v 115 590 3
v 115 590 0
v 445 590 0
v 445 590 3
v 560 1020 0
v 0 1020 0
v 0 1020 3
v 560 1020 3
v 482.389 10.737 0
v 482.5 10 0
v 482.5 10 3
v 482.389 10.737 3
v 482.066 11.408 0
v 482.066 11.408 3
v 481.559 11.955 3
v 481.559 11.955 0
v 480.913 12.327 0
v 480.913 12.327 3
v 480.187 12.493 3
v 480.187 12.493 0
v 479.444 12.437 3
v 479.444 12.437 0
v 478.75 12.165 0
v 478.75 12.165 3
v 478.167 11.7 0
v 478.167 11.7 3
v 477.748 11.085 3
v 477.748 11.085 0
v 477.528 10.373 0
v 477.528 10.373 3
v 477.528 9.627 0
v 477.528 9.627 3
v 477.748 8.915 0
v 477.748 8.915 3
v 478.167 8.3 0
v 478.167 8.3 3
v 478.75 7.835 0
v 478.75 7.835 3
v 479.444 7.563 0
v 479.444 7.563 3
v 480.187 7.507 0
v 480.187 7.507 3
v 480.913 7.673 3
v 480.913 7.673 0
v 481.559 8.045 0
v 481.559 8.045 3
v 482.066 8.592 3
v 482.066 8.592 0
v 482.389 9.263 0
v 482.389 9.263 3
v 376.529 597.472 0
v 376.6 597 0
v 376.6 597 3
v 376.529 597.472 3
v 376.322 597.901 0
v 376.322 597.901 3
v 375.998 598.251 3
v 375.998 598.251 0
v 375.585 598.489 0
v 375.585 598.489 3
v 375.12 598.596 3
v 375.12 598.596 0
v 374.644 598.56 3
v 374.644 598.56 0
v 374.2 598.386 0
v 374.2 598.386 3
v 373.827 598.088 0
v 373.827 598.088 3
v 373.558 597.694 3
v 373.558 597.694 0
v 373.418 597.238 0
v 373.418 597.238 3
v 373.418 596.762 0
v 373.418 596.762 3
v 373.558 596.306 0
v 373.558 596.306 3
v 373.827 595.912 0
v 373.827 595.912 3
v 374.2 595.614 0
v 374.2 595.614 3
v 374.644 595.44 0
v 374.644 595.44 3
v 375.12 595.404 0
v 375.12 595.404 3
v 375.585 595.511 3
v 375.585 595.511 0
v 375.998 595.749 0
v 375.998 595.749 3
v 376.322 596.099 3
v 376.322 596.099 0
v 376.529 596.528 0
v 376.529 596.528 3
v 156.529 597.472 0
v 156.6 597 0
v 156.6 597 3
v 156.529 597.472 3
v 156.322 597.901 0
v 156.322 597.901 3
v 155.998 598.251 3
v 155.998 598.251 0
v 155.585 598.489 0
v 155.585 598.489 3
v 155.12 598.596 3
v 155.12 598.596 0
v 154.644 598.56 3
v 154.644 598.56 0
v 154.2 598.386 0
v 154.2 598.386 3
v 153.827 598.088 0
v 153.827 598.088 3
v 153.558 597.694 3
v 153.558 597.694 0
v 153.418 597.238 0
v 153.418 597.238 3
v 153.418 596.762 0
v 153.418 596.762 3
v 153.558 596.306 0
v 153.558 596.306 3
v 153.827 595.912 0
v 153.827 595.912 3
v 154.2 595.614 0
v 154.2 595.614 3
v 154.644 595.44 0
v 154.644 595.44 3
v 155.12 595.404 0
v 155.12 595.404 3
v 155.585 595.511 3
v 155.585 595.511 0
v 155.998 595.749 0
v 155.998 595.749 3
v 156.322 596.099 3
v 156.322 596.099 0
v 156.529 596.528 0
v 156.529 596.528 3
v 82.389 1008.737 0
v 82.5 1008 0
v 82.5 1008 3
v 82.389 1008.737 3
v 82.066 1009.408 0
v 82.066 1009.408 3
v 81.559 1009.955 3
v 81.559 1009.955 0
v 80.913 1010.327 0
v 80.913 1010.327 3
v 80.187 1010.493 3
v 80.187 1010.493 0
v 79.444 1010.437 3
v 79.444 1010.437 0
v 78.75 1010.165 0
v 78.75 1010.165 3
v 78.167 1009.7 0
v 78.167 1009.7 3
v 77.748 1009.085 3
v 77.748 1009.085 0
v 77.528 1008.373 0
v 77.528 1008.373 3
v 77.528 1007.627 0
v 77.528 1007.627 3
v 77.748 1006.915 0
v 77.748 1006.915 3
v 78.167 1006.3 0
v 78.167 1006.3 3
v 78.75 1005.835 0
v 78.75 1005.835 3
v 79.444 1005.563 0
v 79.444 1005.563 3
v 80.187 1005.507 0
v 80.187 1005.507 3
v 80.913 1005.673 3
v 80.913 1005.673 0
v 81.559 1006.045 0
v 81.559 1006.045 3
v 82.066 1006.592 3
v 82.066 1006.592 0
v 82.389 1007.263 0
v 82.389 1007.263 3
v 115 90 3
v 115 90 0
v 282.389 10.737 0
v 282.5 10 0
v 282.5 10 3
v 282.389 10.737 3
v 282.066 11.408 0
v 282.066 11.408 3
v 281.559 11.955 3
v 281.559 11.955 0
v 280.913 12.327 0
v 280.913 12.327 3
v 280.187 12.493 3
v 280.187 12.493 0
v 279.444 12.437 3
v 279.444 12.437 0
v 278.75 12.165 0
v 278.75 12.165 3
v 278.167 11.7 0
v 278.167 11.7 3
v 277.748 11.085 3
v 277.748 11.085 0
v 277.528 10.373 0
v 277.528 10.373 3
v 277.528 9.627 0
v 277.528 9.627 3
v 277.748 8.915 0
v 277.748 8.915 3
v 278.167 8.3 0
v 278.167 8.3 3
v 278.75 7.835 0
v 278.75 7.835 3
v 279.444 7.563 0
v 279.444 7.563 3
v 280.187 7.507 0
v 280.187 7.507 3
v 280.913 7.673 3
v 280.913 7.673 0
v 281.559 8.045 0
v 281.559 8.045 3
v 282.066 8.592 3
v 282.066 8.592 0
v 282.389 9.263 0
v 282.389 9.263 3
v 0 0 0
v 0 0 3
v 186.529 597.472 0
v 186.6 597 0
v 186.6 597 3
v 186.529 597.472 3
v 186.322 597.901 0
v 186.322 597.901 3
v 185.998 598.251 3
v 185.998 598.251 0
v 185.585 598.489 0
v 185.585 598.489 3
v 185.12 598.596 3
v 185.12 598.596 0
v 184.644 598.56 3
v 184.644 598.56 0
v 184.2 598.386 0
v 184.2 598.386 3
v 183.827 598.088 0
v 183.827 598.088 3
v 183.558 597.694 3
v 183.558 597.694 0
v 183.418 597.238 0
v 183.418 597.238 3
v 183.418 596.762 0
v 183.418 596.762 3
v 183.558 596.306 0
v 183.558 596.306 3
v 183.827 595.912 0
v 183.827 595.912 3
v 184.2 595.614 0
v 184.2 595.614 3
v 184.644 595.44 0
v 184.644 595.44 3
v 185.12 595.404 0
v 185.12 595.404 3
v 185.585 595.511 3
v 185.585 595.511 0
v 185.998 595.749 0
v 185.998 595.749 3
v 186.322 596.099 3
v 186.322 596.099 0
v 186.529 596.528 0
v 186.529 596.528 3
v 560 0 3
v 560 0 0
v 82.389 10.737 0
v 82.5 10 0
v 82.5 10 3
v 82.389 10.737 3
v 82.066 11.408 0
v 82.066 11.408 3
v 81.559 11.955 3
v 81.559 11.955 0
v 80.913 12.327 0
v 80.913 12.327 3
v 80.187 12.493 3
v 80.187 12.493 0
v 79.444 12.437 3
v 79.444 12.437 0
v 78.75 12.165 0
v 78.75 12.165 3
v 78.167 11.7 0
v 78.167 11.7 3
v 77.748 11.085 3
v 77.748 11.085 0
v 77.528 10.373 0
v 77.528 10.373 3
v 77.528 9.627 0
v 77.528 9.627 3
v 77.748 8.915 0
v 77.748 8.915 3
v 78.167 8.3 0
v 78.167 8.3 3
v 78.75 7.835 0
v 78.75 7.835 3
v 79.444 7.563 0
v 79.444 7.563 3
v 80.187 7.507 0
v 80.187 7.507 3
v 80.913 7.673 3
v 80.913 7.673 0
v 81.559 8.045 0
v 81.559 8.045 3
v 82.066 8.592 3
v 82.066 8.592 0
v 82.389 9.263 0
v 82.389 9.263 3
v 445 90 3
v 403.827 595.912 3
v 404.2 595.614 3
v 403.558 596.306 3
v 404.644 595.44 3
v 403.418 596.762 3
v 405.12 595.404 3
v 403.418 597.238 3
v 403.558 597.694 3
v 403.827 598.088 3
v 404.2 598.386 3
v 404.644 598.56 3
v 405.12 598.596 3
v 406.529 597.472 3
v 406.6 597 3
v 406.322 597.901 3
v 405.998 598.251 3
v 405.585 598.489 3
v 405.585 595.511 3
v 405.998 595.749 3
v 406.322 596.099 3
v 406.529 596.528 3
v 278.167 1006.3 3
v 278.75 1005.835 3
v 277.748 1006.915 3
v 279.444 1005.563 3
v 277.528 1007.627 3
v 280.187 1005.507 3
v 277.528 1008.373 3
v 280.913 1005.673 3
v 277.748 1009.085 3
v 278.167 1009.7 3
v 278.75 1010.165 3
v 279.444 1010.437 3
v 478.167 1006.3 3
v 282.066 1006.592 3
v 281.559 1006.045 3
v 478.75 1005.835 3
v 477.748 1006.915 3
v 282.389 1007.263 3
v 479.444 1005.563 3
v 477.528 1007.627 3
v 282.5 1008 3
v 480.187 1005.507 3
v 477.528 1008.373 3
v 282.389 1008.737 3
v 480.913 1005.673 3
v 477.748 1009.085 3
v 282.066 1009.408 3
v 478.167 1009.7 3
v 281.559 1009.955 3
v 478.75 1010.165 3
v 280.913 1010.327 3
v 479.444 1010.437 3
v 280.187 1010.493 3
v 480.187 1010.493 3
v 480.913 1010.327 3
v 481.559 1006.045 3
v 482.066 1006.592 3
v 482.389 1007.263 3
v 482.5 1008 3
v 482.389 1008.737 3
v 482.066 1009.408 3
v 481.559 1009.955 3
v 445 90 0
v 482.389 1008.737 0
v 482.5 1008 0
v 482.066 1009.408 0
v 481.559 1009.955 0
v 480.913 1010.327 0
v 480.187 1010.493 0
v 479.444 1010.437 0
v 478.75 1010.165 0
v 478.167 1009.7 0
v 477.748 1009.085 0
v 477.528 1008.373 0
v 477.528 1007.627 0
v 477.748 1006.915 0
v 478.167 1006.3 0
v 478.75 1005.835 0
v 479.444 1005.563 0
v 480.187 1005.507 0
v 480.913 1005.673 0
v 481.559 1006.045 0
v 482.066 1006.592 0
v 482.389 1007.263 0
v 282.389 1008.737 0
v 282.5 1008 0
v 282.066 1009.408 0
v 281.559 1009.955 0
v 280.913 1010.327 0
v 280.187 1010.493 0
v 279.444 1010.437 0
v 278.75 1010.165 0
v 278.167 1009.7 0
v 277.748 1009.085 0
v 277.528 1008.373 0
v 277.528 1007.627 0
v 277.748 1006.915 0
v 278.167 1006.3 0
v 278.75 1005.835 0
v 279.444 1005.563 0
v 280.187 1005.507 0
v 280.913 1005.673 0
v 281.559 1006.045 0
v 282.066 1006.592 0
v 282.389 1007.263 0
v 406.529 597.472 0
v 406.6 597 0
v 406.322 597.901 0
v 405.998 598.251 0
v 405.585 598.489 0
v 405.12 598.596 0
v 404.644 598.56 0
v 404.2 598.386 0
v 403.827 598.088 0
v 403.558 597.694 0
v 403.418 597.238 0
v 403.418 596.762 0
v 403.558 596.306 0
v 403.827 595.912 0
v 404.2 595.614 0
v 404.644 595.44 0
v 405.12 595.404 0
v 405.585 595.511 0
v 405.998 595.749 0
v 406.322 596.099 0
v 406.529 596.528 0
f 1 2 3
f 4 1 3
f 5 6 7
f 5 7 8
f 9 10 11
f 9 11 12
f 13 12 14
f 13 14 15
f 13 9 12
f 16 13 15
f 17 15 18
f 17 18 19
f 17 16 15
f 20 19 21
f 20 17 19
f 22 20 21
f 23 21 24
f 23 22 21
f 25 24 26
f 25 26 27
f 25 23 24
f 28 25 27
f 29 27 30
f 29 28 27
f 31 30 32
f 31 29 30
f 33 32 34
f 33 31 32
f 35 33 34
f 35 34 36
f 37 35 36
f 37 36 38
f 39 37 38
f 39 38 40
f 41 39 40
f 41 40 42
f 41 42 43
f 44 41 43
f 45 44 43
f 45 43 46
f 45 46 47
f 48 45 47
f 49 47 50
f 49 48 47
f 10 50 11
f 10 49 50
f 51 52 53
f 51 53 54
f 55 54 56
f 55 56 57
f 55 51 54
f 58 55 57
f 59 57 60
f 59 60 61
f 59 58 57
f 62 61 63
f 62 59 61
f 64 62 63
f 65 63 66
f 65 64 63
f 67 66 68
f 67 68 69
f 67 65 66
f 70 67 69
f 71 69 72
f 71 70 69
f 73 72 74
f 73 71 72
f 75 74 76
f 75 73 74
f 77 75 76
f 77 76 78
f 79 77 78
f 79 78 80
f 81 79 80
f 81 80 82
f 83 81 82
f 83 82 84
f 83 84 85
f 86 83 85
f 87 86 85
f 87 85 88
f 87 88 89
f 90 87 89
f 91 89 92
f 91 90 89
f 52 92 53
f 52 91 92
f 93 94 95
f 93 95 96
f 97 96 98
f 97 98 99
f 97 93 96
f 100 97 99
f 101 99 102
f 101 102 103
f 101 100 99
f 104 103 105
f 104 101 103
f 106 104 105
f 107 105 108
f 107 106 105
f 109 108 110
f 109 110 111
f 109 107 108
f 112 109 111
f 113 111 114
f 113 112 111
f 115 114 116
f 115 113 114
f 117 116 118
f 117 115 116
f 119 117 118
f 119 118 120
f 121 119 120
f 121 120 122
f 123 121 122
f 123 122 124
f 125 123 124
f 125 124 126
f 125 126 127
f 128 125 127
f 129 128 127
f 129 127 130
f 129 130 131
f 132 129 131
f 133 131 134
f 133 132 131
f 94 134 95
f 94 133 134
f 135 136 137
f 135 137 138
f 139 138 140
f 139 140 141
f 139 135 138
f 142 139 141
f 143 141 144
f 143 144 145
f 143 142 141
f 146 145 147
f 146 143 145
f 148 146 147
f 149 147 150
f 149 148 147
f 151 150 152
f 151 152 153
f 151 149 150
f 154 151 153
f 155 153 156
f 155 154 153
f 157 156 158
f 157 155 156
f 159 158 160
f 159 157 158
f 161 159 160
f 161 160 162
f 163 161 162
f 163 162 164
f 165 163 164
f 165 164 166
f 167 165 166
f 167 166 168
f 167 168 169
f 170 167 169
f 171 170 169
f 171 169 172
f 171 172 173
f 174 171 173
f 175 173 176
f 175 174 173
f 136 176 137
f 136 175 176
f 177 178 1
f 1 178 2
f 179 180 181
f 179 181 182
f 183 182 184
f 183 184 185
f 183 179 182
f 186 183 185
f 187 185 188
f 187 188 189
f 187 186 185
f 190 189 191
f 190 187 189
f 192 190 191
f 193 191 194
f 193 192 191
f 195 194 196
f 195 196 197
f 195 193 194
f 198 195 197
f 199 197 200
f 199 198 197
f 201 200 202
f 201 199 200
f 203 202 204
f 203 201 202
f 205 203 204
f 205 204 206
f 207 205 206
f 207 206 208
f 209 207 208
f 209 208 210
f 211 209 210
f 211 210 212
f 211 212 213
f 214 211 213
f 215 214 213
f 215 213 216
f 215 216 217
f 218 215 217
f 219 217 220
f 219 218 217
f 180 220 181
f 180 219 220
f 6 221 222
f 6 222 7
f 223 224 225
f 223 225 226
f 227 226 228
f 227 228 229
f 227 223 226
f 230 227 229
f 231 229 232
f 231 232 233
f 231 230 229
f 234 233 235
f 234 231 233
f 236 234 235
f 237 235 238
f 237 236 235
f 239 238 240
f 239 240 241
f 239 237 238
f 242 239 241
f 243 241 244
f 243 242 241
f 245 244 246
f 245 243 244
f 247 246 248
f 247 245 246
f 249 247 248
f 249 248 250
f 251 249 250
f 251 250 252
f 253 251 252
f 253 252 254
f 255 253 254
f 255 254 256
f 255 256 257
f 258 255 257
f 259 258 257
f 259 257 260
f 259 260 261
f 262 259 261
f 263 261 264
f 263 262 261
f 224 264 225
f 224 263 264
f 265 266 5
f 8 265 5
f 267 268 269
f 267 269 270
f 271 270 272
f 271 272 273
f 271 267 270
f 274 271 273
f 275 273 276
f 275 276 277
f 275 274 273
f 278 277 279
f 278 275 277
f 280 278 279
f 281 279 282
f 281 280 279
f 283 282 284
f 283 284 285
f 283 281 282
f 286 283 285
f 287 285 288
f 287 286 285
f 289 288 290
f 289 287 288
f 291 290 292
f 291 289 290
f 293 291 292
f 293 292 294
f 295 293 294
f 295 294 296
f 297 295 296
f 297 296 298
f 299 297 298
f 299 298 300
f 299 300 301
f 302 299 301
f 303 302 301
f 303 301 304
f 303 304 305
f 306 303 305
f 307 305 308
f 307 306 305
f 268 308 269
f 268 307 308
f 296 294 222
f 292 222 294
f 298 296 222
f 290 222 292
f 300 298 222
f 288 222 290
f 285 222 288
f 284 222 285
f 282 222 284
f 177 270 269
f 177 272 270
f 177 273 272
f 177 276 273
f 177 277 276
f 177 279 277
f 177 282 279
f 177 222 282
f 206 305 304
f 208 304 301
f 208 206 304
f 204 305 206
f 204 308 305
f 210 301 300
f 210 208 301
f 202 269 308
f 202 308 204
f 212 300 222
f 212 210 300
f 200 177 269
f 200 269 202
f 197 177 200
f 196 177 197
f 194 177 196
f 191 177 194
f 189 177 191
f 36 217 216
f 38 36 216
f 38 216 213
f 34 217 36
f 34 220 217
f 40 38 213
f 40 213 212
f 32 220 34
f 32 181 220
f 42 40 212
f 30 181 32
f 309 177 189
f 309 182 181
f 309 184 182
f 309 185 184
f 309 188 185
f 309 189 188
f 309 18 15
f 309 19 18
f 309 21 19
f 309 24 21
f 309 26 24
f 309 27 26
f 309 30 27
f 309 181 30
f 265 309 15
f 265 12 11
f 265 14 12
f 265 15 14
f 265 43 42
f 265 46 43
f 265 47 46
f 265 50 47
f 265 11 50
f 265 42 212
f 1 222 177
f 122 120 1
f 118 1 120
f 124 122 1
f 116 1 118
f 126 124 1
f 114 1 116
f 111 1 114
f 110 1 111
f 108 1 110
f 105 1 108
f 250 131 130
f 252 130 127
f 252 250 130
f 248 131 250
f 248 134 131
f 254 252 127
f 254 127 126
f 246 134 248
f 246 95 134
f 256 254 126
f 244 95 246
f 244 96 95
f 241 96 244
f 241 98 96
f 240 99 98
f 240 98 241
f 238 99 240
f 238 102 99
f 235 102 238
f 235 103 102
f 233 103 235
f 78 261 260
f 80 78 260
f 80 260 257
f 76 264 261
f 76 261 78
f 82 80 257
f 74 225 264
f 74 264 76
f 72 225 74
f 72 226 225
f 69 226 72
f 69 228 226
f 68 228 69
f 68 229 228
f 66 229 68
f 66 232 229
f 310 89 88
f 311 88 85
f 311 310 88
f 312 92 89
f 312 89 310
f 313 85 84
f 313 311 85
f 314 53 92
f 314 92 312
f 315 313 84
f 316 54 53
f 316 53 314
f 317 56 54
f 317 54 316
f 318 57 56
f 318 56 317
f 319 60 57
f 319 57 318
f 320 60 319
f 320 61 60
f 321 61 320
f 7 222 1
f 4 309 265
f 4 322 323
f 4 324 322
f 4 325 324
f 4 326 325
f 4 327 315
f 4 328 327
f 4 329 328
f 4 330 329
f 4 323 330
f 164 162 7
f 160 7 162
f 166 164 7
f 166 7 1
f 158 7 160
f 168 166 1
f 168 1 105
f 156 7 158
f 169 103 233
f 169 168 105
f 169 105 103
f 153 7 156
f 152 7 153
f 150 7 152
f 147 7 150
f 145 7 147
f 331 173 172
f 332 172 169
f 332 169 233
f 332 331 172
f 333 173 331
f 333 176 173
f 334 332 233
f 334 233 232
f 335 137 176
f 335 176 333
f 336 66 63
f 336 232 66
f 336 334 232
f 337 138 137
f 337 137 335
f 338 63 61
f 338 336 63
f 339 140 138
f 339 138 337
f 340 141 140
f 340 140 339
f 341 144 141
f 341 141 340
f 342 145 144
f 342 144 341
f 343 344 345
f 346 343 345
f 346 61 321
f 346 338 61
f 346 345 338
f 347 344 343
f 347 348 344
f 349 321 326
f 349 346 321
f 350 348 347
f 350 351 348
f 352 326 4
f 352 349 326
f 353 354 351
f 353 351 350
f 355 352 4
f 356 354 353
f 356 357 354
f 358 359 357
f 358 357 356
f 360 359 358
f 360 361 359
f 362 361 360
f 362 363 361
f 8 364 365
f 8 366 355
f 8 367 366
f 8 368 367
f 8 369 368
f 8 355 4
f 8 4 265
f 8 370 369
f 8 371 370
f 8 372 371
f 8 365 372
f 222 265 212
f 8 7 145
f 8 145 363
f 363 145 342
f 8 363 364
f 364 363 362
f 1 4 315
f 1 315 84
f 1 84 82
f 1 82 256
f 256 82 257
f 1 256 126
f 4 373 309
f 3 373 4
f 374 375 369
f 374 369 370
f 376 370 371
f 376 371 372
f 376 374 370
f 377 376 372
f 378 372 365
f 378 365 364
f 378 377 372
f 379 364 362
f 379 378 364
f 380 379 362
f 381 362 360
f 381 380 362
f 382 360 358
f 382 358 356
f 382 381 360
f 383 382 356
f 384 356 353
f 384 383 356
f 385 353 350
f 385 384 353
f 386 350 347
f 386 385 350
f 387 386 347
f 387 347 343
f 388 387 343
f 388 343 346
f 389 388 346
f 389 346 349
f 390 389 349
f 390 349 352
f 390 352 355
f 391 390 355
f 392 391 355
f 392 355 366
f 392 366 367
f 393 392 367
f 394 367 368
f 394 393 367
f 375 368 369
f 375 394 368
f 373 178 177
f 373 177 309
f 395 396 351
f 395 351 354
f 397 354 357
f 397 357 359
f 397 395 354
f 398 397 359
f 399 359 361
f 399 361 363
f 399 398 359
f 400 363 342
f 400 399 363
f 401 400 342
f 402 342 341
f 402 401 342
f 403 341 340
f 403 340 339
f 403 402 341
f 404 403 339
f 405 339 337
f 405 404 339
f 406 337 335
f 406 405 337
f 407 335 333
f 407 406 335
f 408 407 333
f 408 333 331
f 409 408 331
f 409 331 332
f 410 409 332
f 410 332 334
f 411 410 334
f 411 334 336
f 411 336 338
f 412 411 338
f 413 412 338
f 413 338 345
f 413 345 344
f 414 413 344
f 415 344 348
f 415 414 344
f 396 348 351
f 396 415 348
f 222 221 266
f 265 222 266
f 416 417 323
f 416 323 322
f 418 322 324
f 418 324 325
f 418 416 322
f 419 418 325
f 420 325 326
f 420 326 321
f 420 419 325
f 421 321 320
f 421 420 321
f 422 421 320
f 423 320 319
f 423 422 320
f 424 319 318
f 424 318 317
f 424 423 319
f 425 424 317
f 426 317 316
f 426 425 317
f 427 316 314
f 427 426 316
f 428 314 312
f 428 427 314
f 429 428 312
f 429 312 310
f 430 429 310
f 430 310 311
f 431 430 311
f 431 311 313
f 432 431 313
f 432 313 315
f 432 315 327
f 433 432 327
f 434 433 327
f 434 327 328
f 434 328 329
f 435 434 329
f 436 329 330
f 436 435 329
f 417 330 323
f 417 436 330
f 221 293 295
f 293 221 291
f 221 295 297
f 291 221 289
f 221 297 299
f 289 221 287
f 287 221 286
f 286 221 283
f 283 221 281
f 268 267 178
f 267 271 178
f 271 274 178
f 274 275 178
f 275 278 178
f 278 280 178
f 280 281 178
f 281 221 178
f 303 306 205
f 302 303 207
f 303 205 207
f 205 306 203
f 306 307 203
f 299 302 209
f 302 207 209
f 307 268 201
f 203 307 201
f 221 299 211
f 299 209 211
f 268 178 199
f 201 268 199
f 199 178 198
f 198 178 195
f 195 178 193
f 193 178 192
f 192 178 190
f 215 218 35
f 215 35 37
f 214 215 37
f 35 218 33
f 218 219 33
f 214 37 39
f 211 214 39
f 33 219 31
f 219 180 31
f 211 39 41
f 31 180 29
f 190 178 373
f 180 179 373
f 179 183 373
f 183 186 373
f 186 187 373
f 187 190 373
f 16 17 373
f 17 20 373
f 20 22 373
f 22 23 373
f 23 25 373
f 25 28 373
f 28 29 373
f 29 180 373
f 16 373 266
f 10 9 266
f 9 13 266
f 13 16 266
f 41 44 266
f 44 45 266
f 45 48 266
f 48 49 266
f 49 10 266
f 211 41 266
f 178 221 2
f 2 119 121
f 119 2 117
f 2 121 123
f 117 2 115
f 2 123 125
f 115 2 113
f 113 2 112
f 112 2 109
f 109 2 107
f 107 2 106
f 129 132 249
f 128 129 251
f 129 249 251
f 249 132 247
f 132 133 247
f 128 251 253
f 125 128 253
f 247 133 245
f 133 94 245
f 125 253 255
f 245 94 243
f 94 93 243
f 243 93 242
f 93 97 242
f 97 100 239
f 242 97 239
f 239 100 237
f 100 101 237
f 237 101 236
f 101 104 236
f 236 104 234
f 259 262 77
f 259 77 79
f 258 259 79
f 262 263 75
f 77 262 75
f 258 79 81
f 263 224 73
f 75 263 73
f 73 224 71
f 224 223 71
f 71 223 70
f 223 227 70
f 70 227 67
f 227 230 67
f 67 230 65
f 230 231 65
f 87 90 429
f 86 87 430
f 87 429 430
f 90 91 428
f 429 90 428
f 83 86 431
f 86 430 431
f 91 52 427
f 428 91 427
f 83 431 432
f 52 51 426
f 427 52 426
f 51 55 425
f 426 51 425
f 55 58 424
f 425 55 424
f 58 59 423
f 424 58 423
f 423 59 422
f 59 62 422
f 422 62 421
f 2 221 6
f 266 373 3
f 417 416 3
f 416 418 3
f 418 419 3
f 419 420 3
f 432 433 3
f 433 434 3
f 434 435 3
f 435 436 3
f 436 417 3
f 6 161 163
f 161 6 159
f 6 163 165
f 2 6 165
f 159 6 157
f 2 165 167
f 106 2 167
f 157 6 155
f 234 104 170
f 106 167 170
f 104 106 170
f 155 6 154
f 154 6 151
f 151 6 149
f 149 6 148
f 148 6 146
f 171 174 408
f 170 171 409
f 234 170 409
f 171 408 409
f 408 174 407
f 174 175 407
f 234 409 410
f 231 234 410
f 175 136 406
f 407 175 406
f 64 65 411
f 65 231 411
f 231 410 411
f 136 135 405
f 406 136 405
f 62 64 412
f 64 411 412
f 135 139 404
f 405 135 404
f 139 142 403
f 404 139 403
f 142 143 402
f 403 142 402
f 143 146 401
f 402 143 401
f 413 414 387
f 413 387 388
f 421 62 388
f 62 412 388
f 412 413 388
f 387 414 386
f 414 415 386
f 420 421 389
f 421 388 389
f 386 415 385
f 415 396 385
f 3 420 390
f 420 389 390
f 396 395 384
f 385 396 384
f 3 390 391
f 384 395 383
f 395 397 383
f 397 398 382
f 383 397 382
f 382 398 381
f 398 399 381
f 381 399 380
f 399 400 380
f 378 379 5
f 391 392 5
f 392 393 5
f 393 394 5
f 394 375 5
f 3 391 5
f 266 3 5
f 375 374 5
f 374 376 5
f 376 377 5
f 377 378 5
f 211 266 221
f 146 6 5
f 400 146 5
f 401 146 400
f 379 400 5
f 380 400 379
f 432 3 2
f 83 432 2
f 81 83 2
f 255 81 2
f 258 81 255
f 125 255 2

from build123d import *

# Parameters (mm, degrees)
SKETCH_W   = 560
SKETCH_H   = 1020
SKETCH_R   = 2.5
SKETCH_R_2 = 1.6
SKETCH_W_2 = 330
SKETCH_H_2 = 500
PAD_DEPTH  = 3


with BuildPart() as part:
    # Sketch → Pad (new body)
    with BuildSketch(Plane.XY):
        with Locations((280, 510)):
            Rectangle(SKETCH_W, SKETCH_H)
        with Locations((80, 1008)):
            Circle(SKETCH_R, mode=Mode.SUBTRACT)
        with Locations((280, 1008)):
            Circle(SKETCH_R, mode=Mode.SUBTRACT)
        with Locations((480, 1008)):
            Circle(SKETCH_R, mode=Mode.SUBTRACT)
        with Locations((80, 10)):
            Circle(SKETCH_R, mode=Mode.SUBTRACT)
        with Locations((280, 10)):
            Circle(SKETCH_R, mode=Mode.SUBTRACT)
        with Locations((480, 10)):
            Circle(SKETCH_R, mode=Mode.SUBTRACT)
        with Locations((405, 597)):
            Circle(SKETCH_R_2, mode=Mode.SUBTRACT)
        with Locations((155, 597)):
            Circle(SKETCH_R_2, mode=Mode.SUBTRACT)
        with Locations((185, 597)):
            Circle(SKETCH_R_2, mode=Mode.SUBTRACT)
        with Locations((375, 597)):
            Circle(SKETCH_R_2, mode=Mode.SUBTRACT)
        with Locations((280, 340)):
            Rectangle(SKETCH_W_2, SKETCH_H_2, mode=Mode.SUBTRACT)
    extrude(amount=PAD_DEPTH)


solid = part.part
